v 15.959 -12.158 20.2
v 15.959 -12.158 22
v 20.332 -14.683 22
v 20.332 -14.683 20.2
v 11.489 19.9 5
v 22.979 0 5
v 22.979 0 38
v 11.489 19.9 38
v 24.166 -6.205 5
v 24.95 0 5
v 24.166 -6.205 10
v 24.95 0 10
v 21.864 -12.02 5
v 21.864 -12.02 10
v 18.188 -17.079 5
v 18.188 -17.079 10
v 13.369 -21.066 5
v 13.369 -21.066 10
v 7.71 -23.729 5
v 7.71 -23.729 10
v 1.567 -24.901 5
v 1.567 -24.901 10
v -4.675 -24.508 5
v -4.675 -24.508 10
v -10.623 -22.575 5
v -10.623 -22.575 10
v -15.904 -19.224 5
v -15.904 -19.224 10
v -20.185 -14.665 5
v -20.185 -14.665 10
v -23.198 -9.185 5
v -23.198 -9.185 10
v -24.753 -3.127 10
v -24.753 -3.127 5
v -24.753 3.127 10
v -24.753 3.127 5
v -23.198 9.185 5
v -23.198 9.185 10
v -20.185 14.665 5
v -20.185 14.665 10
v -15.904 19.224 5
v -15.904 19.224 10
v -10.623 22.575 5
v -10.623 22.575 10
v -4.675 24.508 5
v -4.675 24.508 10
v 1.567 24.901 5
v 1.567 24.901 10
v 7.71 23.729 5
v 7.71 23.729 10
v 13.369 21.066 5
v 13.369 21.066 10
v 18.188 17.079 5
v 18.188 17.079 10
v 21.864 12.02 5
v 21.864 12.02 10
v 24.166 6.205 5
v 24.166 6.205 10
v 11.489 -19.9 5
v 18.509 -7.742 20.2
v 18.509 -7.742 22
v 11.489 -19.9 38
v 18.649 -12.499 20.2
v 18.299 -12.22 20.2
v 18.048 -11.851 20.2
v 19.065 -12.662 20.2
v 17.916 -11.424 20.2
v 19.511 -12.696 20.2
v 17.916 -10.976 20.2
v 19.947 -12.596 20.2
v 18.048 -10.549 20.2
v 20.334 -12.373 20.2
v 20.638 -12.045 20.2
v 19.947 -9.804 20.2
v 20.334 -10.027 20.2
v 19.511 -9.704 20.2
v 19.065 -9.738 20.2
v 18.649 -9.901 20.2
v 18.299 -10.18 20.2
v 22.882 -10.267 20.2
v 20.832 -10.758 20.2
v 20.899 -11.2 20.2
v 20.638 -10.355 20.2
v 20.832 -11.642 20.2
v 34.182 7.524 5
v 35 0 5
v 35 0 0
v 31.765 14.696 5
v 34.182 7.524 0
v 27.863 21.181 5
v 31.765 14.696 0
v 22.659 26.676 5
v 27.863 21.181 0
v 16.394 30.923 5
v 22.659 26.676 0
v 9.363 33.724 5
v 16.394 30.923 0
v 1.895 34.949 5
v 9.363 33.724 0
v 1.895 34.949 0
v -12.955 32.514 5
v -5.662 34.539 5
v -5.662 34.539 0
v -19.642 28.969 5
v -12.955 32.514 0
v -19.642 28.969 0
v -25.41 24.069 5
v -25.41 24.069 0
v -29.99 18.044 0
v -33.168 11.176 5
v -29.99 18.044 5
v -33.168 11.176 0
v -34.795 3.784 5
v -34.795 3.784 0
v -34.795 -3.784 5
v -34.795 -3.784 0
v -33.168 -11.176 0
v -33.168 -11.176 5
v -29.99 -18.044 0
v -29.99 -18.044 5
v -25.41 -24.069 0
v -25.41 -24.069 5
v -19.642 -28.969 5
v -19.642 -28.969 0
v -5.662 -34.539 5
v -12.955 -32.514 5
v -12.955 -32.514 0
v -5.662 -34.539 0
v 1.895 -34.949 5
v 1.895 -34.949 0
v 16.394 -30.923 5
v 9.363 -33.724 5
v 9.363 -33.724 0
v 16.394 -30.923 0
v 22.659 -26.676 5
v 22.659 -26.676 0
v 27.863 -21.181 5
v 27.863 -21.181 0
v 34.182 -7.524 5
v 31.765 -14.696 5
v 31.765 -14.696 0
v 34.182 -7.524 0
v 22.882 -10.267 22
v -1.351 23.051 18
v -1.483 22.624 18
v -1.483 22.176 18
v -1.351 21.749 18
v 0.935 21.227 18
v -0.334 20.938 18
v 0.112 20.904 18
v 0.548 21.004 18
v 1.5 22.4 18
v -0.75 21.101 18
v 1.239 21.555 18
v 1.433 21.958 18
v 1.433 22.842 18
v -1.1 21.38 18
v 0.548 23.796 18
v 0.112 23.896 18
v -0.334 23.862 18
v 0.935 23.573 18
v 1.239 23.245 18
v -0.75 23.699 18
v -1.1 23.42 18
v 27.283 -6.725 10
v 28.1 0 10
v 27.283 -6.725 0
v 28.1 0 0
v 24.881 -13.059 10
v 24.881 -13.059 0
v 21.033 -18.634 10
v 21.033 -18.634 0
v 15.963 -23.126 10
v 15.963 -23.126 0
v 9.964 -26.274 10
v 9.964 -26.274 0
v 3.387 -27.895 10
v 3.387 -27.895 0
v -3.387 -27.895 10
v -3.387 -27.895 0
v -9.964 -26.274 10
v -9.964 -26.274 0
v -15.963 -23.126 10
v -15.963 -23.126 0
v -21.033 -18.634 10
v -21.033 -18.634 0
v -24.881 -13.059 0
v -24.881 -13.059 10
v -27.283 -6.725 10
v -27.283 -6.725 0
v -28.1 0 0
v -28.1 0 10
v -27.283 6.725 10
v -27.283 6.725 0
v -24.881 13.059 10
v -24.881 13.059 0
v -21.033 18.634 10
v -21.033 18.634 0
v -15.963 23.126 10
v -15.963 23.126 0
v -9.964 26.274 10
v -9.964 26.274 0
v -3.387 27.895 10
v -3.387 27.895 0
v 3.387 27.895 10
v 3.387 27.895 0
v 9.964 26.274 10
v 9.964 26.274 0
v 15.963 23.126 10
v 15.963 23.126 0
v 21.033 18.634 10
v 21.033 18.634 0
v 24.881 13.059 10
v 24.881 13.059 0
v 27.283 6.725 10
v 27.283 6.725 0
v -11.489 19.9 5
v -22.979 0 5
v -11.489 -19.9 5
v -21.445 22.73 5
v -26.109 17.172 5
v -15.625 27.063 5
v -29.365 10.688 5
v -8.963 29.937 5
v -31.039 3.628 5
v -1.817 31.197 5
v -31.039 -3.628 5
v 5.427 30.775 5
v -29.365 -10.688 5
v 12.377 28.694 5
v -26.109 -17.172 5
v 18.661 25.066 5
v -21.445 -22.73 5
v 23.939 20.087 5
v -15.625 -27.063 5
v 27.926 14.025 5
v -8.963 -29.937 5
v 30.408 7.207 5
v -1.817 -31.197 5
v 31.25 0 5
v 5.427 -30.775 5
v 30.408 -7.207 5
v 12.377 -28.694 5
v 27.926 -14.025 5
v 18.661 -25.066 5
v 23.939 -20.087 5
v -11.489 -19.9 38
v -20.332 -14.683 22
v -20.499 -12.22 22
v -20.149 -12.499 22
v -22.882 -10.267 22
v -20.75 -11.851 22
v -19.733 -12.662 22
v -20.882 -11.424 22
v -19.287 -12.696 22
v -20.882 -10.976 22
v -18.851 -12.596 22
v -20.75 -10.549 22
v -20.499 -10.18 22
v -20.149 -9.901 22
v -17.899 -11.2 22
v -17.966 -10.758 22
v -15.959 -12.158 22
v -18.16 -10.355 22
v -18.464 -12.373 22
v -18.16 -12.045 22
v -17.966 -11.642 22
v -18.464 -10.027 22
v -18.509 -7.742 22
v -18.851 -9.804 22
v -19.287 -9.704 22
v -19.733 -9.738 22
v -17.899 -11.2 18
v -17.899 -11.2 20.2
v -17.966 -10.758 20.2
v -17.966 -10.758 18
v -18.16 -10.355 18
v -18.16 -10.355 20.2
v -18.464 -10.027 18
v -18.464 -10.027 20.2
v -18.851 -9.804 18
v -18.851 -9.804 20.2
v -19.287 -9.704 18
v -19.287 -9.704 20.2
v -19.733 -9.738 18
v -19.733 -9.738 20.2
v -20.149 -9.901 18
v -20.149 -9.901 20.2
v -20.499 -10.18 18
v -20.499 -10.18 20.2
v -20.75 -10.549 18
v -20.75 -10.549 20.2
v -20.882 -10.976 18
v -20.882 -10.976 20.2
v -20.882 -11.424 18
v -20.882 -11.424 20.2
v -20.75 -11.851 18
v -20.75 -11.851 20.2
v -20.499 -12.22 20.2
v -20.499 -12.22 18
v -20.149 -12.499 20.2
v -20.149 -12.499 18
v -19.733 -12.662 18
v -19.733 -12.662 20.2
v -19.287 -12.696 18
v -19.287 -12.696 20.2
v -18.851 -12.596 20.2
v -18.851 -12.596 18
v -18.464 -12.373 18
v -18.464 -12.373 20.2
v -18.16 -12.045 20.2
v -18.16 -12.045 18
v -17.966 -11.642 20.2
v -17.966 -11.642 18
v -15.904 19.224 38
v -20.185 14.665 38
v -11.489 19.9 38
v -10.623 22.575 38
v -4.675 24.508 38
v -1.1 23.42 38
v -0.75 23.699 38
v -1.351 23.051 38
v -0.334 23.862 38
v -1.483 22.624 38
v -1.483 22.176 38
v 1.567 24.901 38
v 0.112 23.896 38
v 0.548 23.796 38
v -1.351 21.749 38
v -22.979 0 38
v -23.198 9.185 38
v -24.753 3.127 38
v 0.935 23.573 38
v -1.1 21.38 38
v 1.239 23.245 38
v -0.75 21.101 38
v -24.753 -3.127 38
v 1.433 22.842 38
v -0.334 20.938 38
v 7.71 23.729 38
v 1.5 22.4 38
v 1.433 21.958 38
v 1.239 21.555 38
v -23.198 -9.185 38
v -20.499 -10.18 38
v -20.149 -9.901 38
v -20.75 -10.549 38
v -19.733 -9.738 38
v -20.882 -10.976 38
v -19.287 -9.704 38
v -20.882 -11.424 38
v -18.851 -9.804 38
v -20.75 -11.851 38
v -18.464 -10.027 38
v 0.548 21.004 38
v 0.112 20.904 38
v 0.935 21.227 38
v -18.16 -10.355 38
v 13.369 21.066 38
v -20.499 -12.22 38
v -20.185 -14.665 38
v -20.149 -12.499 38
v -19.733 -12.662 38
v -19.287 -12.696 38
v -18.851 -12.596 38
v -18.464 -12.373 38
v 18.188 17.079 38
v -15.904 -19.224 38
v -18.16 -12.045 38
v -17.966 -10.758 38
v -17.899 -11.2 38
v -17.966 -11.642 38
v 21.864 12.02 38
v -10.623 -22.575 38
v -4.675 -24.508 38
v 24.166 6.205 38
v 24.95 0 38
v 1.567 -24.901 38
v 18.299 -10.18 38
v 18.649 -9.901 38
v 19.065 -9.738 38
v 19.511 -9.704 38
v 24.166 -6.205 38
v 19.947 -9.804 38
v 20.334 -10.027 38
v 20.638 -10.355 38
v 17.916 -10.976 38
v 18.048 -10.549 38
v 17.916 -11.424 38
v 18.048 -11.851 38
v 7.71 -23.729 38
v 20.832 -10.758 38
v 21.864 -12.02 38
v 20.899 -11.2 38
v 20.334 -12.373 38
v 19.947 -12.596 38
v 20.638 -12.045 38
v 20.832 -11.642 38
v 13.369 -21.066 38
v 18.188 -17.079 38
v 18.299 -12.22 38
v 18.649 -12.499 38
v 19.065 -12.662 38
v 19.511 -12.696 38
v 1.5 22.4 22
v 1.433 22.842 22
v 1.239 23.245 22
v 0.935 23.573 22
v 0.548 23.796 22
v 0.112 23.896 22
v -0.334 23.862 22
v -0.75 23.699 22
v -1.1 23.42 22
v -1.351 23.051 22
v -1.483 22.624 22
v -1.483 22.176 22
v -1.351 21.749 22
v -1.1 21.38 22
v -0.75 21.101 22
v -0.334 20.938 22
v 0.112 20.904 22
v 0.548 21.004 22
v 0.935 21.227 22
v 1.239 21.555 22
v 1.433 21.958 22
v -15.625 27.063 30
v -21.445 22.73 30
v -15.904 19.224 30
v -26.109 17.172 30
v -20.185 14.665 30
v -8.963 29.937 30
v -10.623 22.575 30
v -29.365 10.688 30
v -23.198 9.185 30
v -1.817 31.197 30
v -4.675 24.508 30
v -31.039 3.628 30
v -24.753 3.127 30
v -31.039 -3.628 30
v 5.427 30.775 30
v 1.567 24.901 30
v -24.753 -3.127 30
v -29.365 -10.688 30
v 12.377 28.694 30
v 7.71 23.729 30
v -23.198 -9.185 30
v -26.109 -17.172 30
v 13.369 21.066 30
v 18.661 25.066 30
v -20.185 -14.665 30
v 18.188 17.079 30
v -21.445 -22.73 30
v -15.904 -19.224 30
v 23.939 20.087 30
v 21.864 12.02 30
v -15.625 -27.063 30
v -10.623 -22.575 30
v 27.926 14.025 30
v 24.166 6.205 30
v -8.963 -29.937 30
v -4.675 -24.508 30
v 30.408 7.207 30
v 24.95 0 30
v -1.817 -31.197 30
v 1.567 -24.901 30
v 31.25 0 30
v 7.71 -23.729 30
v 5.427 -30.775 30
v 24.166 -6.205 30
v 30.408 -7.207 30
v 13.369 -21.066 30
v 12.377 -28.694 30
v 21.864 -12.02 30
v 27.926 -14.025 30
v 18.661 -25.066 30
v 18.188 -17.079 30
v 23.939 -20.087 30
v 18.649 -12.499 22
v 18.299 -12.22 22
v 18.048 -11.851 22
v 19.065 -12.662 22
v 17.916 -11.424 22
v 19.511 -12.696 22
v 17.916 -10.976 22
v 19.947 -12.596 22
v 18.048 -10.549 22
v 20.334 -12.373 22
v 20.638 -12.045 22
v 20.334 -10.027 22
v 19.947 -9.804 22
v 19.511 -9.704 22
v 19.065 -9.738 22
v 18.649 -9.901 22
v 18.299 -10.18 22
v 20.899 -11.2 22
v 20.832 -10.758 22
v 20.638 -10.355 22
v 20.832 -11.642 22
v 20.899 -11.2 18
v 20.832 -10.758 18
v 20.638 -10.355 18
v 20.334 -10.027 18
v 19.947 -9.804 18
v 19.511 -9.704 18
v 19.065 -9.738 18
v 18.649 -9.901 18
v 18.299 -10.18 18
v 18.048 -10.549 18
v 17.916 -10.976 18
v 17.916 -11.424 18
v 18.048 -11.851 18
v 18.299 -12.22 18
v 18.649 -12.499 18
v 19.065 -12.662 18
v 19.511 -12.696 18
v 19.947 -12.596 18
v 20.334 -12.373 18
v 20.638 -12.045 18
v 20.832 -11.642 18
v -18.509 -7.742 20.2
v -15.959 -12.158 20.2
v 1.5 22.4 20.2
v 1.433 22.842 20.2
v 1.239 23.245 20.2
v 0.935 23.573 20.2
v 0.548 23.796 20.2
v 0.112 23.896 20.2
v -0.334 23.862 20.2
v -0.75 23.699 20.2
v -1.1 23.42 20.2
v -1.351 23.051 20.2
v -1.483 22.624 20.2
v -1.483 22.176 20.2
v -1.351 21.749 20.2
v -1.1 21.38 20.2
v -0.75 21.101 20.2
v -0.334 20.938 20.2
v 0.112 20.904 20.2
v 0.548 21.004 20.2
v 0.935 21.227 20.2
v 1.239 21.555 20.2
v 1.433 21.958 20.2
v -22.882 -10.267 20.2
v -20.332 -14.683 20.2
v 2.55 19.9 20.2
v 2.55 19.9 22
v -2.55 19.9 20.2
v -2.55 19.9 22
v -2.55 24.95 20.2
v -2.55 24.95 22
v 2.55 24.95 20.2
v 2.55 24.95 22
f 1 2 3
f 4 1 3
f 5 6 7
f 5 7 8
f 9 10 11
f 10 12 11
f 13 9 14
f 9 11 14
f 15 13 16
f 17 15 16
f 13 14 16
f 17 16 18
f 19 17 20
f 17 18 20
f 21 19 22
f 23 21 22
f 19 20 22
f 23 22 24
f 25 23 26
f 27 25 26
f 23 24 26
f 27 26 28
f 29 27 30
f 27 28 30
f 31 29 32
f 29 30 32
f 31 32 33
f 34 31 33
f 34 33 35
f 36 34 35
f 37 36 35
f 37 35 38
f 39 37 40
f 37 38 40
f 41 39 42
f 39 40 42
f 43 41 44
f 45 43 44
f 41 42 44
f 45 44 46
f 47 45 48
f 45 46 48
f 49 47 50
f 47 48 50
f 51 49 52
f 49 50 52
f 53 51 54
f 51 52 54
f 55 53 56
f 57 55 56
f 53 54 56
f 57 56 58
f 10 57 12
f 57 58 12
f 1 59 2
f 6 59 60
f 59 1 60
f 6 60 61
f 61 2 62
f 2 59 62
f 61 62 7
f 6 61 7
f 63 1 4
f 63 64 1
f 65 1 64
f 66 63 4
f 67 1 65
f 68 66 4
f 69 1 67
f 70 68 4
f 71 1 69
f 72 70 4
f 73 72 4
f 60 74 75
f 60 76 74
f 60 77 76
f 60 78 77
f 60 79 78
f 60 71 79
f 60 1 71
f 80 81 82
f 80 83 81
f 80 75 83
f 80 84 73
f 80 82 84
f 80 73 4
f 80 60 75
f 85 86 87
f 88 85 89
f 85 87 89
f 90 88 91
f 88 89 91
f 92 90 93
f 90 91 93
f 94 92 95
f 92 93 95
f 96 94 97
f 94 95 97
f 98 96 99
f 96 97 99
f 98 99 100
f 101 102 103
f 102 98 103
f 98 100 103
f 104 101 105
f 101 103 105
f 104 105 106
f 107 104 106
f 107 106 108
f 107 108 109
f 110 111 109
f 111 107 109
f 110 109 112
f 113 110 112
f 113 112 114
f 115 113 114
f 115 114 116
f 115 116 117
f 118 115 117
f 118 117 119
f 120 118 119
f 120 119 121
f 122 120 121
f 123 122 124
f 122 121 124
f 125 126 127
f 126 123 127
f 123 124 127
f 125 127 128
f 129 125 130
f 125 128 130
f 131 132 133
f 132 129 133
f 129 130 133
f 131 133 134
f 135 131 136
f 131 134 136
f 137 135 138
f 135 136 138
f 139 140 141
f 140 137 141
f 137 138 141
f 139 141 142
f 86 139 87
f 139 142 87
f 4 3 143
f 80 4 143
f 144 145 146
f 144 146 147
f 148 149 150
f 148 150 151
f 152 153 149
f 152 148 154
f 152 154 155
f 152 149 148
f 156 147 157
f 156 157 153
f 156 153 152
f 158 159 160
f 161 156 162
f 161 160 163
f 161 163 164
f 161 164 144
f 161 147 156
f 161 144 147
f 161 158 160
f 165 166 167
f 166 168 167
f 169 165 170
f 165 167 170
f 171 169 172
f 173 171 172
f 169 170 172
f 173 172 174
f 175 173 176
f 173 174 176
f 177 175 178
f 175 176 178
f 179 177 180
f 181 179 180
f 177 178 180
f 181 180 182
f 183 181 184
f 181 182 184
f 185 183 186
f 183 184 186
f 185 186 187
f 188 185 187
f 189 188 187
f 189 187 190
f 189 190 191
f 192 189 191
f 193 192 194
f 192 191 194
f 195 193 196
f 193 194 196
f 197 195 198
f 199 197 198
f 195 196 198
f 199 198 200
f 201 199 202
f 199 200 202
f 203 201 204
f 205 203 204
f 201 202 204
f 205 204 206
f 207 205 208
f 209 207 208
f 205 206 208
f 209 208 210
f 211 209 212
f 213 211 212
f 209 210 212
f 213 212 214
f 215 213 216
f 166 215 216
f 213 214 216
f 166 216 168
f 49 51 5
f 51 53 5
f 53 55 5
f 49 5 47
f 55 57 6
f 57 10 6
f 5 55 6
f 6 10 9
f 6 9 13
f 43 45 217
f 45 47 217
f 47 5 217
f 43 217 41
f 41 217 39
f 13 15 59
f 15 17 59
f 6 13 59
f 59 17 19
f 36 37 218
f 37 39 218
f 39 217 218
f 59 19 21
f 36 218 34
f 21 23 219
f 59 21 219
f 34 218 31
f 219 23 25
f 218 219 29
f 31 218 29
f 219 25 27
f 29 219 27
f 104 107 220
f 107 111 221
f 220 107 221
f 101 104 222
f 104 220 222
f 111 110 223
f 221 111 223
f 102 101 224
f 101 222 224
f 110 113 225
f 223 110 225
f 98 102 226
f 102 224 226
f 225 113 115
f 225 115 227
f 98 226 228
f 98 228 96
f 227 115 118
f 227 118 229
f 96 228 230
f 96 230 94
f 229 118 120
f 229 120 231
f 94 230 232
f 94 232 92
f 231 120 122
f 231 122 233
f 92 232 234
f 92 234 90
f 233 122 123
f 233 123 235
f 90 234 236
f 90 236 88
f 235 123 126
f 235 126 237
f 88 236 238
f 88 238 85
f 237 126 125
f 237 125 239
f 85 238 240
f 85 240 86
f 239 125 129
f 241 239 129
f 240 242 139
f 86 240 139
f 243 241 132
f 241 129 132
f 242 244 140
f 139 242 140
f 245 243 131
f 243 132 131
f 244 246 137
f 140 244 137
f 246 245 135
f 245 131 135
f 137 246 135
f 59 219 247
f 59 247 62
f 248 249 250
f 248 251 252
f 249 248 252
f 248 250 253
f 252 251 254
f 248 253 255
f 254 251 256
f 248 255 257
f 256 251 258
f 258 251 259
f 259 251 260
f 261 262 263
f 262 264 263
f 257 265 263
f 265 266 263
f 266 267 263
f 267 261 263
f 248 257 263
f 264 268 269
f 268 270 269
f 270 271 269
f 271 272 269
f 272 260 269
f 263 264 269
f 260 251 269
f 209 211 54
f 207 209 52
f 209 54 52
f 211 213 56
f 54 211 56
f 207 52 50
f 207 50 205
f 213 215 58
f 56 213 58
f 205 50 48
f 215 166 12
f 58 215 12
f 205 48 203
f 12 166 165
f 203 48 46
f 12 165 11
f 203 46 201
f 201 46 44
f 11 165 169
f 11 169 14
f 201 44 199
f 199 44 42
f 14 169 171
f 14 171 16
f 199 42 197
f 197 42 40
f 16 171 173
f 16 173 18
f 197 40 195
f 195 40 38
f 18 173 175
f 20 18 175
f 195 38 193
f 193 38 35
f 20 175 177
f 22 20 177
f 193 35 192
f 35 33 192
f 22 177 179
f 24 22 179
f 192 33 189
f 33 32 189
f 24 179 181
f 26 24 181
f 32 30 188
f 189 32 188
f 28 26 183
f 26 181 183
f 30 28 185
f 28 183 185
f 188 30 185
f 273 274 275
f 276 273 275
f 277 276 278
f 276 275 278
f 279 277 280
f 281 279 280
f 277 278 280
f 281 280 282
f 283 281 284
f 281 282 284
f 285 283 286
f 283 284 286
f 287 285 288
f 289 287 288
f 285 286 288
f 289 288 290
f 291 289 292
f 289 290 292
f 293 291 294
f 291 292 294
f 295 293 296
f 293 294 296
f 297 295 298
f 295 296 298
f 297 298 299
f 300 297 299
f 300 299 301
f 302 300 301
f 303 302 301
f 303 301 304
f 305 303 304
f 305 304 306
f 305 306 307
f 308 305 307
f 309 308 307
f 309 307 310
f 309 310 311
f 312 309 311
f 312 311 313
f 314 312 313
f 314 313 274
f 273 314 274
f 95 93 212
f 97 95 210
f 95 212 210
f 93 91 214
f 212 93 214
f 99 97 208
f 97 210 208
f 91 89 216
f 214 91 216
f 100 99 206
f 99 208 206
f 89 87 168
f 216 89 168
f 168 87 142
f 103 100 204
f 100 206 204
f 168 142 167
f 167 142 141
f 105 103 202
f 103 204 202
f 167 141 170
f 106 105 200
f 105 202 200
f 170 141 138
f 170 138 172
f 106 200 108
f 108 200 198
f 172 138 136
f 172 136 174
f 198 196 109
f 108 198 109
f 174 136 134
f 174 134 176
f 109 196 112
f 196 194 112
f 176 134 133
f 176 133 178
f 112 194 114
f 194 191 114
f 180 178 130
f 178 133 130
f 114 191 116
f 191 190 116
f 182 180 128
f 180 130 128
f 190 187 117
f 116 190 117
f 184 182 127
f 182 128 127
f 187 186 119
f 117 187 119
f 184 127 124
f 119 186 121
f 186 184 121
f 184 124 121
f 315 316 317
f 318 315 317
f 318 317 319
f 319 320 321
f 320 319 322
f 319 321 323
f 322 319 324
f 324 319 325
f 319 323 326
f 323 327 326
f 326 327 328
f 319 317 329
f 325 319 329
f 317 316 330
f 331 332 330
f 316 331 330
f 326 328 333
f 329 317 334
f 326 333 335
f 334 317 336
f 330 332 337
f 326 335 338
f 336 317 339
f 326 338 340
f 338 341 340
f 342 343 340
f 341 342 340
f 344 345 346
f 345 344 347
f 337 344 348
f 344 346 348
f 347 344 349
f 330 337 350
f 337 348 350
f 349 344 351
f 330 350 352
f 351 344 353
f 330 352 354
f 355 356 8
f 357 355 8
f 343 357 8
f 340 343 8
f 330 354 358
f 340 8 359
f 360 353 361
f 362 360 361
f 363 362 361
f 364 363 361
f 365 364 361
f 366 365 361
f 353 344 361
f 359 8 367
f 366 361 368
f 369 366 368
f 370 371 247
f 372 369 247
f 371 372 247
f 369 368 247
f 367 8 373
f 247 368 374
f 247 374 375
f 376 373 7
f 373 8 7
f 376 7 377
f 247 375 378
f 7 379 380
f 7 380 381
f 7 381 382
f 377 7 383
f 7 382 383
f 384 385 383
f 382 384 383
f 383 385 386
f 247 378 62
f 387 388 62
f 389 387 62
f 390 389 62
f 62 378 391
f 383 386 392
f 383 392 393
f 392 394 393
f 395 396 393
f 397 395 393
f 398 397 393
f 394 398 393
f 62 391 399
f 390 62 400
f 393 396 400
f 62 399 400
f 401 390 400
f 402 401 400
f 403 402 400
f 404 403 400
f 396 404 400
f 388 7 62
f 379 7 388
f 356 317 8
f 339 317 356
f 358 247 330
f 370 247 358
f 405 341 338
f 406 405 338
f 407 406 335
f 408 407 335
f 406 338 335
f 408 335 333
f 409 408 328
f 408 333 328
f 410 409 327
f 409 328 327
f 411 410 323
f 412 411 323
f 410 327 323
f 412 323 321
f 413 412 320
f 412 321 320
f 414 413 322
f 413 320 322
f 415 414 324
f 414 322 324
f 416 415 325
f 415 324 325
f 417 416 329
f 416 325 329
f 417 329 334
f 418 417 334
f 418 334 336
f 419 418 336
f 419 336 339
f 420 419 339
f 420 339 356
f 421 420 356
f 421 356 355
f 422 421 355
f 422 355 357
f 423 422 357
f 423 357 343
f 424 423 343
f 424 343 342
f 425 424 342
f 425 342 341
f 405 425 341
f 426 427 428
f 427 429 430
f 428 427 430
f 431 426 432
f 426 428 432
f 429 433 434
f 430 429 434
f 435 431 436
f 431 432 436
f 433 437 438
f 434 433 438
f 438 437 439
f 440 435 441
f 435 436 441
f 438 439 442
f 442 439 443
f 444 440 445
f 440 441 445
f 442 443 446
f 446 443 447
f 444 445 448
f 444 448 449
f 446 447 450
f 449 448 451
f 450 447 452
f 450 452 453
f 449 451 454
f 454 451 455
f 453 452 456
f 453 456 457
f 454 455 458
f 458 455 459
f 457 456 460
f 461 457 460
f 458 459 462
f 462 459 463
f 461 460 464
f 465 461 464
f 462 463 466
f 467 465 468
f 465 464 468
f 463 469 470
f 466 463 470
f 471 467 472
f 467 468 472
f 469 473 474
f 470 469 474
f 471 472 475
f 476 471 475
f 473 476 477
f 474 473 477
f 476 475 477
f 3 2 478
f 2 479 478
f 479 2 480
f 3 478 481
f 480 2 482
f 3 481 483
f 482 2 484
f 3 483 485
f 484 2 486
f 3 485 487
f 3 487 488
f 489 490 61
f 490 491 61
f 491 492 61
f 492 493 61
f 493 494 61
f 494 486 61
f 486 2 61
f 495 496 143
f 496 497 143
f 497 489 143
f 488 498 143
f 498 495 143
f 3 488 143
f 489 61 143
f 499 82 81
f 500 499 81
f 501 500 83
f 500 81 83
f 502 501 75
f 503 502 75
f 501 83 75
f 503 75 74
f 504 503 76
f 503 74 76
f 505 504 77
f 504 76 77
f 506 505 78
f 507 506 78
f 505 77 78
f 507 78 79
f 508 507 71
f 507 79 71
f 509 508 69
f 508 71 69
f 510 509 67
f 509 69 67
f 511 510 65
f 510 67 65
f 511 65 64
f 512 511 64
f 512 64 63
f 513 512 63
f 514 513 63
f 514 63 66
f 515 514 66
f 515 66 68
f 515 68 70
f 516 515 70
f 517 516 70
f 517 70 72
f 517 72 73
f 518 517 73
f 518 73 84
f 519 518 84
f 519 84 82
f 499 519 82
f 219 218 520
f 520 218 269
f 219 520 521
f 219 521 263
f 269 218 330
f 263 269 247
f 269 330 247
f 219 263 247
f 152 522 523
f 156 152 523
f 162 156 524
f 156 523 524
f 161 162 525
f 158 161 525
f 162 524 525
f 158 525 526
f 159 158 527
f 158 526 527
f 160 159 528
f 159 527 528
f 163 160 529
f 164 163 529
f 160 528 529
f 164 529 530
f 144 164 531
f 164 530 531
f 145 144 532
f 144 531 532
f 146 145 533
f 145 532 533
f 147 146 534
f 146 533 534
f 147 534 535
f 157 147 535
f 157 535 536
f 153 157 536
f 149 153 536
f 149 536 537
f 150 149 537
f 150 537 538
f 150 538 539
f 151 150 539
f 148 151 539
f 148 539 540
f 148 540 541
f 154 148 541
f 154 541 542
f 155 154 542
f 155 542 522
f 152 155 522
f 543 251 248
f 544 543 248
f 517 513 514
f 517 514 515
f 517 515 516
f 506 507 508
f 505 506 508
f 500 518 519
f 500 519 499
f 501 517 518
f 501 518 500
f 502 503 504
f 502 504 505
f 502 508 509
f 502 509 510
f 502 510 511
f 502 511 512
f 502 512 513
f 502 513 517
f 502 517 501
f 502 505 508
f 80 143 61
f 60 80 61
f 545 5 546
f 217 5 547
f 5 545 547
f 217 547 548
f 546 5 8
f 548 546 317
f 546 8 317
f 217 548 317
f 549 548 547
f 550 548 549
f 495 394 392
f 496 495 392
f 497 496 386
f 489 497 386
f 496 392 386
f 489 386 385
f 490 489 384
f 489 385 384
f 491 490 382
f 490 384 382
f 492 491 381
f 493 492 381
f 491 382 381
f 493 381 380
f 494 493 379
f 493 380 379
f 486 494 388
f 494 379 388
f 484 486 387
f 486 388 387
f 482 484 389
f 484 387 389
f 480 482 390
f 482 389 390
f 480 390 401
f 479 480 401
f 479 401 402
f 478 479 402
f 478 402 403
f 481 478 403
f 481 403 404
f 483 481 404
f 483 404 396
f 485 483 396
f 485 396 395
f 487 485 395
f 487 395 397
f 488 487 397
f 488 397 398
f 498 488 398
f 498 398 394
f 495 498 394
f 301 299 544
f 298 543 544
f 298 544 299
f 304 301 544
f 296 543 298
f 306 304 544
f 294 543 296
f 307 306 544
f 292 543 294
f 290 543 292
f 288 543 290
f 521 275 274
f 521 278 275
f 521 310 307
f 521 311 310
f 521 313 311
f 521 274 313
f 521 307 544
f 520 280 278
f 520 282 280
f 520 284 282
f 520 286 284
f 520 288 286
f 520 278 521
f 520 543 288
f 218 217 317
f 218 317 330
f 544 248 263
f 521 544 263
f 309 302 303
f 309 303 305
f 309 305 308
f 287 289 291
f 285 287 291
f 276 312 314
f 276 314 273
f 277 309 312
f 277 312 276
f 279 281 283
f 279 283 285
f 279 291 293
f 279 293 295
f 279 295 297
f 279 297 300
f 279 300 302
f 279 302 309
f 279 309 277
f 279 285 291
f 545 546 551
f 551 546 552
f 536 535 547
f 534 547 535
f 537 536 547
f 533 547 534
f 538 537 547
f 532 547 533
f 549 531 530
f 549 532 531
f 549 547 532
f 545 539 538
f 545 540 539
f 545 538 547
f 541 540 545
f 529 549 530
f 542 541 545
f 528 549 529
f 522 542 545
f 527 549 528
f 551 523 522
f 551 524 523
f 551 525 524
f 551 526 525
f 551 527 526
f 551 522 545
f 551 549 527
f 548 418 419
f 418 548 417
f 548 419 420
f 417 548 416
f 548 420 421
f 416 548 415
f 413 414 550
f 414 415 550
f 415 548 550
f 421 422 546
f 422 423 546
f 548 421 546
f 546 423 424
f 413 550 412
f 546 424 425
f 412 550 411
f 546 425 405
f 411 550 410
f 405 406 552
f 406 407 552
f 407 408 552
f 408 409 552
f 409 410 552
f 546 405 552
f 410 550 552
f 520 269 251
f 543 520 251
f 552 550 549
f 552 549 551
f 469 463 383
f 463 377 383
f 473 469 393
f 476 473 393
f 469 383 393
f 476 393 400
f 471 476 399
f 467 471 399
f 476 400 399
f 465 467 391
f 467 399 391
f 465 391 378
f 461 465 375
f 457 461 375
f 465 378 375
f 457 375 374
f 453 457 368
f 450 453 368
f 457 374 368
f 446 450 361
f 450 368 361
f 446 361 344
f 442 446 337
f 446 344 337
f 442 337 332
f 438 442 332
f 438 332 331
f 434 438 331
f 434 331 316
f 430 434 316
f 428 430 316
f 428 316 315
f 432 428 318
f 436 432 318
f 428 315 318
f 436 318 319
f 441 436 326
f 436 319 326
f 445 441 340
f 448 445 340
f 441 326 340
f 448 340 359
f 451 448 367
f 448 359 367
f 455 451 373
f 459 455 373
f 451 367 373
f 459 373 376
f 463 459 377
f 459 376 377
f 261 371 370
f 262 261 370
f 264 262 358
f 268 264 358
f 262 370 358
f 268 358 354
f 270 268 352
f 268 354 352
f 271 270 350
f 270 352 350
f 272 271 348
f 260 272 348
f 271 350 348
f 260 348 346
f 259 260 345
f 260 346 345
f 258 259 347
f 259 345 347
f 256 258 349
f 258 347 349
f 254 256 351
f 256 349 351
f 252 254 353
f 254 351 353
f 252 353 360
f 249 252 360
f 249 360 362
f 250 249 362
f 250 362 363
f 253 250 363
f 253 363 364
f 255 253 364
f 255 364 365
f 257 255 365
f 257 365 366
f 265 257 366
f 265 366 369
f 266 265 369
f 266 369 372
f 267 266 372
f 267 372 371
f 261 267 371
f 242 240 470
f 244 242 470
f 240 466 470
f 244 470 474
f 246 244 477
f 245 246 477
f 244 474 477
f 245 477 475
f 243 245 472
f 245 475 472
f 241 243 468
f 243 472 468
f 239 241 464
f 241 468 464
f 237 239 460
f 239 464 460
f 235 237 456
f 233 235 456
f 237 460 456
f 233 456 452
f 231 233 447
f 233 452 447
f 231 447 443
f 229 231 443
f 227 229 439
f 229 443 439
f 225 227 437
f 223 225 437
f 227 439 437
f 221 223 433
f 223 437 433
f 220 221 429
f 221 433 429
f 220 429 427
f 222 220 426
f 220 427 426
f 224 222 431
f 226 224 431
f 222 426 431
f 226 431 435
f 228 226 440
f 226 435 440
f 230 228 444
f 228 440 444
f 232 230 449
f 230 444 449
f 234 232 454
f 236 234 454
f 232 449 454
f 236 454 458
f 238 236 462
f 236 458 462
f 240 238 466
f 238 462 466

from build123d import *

# Parameters (mm, degrees)
CUT_EXTRUDE1_DEPTH = 71.512410255
SKETCH3_R          = 1.5
CUT_EXTRUDE2_DEPTH = 20
SKETCH4_W          = 5.1
SKETCH4_H          = 5.05
CUT_EXTRUDE3_DEPTH = 1.8
SKETCH6_R          = 2.55
CUT_EXTRUDE4_DEPTH = 3
SKETCH7_R          = 1.75
CUT_EXTRUDE5_DEPTH = 3
SKETCH8_OUTSIDE_W  = 110.944
SKETCH8_OUTSIDE_H  = 110.944
SKETCH8_OUTSIDE_R  = 35
CUT_EXTRUDE6_DEPTH = 71.512410255


with BuildPart() as part:
    # Sketch1 → Revolve1 (revolve)
    with BuildSketch(Plane(origin=(0, 0, 0), x_dir=(1, 0, 0), z_dir=(0, 1, 0))):
        Polygon((19.9, -38), (19.9, -5), (24.95, -5), (24.95, -10), (28.1, -10), (28.1, 0), (42, 0), (42, -5), (31.25, -5), (31.25, -30), (24.95, -30), (24.95, -38), align=None)
    revolve(axis=Axis((0, 0, 57.825795551), (0, 0, -1)))

    # Sketch2 → Cut-Extrude1 (cut, through all)
    with BuildSketch(Plane.XY.offset(38)):
        Polygon((-22.978540714, 0), (-11.489270357, -19.9), (11.489270357, -19.9), (22.978540714, 0), (11.489270357, 19.9), (-11.489270357, 19.9), align=None)
    extrude(amount=-CUT_EXTRUDE1_DEPTH, mode=Mode.SUBTRACT)

    # Sketch3 → Cut-Extrude2 (cut)
    with BuildSketch(Plane.XY.offset(38)):
        with Locations((0, 22.4)):
            Circle(SKETCH3_R)
        with Locations((19.398969045, -11.2)):
            Circle(SKETCH3_R)
        with Locations((-19.398969045, -11.2)):
            Circle(SKETCH3_R)
    extrude(amount=-CUT_EXTRUDE2_DEPTH, mode=Mode.SUBTRACT)

    # Sketch4 → Cut-Extrude3 (cut)
    with BuildSketch(Plane.XY.offset(22)):
        with Locations((0, 22.425)):
            Rectangle(SKETCH4_W, SKETCH4_H)
        Polygon((18.508905535, -7.74163522), (15.958905535, -12.15836478), (20.332333824, -14.68336478), (22.882333824, -10.26663522), align=None)
        Polygon((-15.958905535, -12.15836478), (-18.508905535, -7.74163522), (-22.882333824, -10.26663522), (-20.332333824, -14.68336478), align=None)
    extrude(amount=-CUT_EXTRUDE3_DEPTH, mode=Mode.SUBTRACT)

    # Sketch6 → Cut-Extrude4 (cut)
    with BuildSketch(Plane(origin=(0, 0, 0), x_dir=(-1, 0, 0), z_dir=(0, 0, -1))):
        with Locations((0, 38)):
            Circle(SKETCH6_R)
        with Locations((38, 0)):
            Circle(SKETCH6_R)
        with Locations((0, -38)):
            Circle(SKETCH6_R)
        with Locations((-38, 0)):
            Circle(SKETCH6_R)
    extrude(amount=-CUT_EXTRUDE4_DEPTH, mode=Mode.SUBTRACT)

    # Sketch7 → Cut-Extrude5 (cut)
    with BuildSketch(Plane(origin=(0, 0, 3), x_dir=(-1, 0, 0), z_dir=(0, 0, -1))):
        with Locations((0, 38)):
            Circle(SKETCH7_R)
        with Locations((38, 0)):
            Circle(SKETCH7_R)
        with Locations((0, -38)):
            Circle(SKETCH7_R)
        with Locations((-38, 0)):
            Circle(SKETCH7_R)
    extrude(amount=-CUT_EXTRUDE5_DEPTH, mode=Mode.SUBTRACT)

    # Sketch8 outside → Cut-Extrude6 (cut, through all)
    with BuildSketch(Plane.XY):
        Rectangle(SKETCH8_OUTSIDE_W, SKETCH8_OUTSIDE_H)
        Circle(SKETCH8_OUTSIDE_R, mode=Mode.SUBTRACT)
    extrude(amount=CUT_EXTRUDE6_DEPTH, mode=Mode.SUBTRACT)


solid = part.part
